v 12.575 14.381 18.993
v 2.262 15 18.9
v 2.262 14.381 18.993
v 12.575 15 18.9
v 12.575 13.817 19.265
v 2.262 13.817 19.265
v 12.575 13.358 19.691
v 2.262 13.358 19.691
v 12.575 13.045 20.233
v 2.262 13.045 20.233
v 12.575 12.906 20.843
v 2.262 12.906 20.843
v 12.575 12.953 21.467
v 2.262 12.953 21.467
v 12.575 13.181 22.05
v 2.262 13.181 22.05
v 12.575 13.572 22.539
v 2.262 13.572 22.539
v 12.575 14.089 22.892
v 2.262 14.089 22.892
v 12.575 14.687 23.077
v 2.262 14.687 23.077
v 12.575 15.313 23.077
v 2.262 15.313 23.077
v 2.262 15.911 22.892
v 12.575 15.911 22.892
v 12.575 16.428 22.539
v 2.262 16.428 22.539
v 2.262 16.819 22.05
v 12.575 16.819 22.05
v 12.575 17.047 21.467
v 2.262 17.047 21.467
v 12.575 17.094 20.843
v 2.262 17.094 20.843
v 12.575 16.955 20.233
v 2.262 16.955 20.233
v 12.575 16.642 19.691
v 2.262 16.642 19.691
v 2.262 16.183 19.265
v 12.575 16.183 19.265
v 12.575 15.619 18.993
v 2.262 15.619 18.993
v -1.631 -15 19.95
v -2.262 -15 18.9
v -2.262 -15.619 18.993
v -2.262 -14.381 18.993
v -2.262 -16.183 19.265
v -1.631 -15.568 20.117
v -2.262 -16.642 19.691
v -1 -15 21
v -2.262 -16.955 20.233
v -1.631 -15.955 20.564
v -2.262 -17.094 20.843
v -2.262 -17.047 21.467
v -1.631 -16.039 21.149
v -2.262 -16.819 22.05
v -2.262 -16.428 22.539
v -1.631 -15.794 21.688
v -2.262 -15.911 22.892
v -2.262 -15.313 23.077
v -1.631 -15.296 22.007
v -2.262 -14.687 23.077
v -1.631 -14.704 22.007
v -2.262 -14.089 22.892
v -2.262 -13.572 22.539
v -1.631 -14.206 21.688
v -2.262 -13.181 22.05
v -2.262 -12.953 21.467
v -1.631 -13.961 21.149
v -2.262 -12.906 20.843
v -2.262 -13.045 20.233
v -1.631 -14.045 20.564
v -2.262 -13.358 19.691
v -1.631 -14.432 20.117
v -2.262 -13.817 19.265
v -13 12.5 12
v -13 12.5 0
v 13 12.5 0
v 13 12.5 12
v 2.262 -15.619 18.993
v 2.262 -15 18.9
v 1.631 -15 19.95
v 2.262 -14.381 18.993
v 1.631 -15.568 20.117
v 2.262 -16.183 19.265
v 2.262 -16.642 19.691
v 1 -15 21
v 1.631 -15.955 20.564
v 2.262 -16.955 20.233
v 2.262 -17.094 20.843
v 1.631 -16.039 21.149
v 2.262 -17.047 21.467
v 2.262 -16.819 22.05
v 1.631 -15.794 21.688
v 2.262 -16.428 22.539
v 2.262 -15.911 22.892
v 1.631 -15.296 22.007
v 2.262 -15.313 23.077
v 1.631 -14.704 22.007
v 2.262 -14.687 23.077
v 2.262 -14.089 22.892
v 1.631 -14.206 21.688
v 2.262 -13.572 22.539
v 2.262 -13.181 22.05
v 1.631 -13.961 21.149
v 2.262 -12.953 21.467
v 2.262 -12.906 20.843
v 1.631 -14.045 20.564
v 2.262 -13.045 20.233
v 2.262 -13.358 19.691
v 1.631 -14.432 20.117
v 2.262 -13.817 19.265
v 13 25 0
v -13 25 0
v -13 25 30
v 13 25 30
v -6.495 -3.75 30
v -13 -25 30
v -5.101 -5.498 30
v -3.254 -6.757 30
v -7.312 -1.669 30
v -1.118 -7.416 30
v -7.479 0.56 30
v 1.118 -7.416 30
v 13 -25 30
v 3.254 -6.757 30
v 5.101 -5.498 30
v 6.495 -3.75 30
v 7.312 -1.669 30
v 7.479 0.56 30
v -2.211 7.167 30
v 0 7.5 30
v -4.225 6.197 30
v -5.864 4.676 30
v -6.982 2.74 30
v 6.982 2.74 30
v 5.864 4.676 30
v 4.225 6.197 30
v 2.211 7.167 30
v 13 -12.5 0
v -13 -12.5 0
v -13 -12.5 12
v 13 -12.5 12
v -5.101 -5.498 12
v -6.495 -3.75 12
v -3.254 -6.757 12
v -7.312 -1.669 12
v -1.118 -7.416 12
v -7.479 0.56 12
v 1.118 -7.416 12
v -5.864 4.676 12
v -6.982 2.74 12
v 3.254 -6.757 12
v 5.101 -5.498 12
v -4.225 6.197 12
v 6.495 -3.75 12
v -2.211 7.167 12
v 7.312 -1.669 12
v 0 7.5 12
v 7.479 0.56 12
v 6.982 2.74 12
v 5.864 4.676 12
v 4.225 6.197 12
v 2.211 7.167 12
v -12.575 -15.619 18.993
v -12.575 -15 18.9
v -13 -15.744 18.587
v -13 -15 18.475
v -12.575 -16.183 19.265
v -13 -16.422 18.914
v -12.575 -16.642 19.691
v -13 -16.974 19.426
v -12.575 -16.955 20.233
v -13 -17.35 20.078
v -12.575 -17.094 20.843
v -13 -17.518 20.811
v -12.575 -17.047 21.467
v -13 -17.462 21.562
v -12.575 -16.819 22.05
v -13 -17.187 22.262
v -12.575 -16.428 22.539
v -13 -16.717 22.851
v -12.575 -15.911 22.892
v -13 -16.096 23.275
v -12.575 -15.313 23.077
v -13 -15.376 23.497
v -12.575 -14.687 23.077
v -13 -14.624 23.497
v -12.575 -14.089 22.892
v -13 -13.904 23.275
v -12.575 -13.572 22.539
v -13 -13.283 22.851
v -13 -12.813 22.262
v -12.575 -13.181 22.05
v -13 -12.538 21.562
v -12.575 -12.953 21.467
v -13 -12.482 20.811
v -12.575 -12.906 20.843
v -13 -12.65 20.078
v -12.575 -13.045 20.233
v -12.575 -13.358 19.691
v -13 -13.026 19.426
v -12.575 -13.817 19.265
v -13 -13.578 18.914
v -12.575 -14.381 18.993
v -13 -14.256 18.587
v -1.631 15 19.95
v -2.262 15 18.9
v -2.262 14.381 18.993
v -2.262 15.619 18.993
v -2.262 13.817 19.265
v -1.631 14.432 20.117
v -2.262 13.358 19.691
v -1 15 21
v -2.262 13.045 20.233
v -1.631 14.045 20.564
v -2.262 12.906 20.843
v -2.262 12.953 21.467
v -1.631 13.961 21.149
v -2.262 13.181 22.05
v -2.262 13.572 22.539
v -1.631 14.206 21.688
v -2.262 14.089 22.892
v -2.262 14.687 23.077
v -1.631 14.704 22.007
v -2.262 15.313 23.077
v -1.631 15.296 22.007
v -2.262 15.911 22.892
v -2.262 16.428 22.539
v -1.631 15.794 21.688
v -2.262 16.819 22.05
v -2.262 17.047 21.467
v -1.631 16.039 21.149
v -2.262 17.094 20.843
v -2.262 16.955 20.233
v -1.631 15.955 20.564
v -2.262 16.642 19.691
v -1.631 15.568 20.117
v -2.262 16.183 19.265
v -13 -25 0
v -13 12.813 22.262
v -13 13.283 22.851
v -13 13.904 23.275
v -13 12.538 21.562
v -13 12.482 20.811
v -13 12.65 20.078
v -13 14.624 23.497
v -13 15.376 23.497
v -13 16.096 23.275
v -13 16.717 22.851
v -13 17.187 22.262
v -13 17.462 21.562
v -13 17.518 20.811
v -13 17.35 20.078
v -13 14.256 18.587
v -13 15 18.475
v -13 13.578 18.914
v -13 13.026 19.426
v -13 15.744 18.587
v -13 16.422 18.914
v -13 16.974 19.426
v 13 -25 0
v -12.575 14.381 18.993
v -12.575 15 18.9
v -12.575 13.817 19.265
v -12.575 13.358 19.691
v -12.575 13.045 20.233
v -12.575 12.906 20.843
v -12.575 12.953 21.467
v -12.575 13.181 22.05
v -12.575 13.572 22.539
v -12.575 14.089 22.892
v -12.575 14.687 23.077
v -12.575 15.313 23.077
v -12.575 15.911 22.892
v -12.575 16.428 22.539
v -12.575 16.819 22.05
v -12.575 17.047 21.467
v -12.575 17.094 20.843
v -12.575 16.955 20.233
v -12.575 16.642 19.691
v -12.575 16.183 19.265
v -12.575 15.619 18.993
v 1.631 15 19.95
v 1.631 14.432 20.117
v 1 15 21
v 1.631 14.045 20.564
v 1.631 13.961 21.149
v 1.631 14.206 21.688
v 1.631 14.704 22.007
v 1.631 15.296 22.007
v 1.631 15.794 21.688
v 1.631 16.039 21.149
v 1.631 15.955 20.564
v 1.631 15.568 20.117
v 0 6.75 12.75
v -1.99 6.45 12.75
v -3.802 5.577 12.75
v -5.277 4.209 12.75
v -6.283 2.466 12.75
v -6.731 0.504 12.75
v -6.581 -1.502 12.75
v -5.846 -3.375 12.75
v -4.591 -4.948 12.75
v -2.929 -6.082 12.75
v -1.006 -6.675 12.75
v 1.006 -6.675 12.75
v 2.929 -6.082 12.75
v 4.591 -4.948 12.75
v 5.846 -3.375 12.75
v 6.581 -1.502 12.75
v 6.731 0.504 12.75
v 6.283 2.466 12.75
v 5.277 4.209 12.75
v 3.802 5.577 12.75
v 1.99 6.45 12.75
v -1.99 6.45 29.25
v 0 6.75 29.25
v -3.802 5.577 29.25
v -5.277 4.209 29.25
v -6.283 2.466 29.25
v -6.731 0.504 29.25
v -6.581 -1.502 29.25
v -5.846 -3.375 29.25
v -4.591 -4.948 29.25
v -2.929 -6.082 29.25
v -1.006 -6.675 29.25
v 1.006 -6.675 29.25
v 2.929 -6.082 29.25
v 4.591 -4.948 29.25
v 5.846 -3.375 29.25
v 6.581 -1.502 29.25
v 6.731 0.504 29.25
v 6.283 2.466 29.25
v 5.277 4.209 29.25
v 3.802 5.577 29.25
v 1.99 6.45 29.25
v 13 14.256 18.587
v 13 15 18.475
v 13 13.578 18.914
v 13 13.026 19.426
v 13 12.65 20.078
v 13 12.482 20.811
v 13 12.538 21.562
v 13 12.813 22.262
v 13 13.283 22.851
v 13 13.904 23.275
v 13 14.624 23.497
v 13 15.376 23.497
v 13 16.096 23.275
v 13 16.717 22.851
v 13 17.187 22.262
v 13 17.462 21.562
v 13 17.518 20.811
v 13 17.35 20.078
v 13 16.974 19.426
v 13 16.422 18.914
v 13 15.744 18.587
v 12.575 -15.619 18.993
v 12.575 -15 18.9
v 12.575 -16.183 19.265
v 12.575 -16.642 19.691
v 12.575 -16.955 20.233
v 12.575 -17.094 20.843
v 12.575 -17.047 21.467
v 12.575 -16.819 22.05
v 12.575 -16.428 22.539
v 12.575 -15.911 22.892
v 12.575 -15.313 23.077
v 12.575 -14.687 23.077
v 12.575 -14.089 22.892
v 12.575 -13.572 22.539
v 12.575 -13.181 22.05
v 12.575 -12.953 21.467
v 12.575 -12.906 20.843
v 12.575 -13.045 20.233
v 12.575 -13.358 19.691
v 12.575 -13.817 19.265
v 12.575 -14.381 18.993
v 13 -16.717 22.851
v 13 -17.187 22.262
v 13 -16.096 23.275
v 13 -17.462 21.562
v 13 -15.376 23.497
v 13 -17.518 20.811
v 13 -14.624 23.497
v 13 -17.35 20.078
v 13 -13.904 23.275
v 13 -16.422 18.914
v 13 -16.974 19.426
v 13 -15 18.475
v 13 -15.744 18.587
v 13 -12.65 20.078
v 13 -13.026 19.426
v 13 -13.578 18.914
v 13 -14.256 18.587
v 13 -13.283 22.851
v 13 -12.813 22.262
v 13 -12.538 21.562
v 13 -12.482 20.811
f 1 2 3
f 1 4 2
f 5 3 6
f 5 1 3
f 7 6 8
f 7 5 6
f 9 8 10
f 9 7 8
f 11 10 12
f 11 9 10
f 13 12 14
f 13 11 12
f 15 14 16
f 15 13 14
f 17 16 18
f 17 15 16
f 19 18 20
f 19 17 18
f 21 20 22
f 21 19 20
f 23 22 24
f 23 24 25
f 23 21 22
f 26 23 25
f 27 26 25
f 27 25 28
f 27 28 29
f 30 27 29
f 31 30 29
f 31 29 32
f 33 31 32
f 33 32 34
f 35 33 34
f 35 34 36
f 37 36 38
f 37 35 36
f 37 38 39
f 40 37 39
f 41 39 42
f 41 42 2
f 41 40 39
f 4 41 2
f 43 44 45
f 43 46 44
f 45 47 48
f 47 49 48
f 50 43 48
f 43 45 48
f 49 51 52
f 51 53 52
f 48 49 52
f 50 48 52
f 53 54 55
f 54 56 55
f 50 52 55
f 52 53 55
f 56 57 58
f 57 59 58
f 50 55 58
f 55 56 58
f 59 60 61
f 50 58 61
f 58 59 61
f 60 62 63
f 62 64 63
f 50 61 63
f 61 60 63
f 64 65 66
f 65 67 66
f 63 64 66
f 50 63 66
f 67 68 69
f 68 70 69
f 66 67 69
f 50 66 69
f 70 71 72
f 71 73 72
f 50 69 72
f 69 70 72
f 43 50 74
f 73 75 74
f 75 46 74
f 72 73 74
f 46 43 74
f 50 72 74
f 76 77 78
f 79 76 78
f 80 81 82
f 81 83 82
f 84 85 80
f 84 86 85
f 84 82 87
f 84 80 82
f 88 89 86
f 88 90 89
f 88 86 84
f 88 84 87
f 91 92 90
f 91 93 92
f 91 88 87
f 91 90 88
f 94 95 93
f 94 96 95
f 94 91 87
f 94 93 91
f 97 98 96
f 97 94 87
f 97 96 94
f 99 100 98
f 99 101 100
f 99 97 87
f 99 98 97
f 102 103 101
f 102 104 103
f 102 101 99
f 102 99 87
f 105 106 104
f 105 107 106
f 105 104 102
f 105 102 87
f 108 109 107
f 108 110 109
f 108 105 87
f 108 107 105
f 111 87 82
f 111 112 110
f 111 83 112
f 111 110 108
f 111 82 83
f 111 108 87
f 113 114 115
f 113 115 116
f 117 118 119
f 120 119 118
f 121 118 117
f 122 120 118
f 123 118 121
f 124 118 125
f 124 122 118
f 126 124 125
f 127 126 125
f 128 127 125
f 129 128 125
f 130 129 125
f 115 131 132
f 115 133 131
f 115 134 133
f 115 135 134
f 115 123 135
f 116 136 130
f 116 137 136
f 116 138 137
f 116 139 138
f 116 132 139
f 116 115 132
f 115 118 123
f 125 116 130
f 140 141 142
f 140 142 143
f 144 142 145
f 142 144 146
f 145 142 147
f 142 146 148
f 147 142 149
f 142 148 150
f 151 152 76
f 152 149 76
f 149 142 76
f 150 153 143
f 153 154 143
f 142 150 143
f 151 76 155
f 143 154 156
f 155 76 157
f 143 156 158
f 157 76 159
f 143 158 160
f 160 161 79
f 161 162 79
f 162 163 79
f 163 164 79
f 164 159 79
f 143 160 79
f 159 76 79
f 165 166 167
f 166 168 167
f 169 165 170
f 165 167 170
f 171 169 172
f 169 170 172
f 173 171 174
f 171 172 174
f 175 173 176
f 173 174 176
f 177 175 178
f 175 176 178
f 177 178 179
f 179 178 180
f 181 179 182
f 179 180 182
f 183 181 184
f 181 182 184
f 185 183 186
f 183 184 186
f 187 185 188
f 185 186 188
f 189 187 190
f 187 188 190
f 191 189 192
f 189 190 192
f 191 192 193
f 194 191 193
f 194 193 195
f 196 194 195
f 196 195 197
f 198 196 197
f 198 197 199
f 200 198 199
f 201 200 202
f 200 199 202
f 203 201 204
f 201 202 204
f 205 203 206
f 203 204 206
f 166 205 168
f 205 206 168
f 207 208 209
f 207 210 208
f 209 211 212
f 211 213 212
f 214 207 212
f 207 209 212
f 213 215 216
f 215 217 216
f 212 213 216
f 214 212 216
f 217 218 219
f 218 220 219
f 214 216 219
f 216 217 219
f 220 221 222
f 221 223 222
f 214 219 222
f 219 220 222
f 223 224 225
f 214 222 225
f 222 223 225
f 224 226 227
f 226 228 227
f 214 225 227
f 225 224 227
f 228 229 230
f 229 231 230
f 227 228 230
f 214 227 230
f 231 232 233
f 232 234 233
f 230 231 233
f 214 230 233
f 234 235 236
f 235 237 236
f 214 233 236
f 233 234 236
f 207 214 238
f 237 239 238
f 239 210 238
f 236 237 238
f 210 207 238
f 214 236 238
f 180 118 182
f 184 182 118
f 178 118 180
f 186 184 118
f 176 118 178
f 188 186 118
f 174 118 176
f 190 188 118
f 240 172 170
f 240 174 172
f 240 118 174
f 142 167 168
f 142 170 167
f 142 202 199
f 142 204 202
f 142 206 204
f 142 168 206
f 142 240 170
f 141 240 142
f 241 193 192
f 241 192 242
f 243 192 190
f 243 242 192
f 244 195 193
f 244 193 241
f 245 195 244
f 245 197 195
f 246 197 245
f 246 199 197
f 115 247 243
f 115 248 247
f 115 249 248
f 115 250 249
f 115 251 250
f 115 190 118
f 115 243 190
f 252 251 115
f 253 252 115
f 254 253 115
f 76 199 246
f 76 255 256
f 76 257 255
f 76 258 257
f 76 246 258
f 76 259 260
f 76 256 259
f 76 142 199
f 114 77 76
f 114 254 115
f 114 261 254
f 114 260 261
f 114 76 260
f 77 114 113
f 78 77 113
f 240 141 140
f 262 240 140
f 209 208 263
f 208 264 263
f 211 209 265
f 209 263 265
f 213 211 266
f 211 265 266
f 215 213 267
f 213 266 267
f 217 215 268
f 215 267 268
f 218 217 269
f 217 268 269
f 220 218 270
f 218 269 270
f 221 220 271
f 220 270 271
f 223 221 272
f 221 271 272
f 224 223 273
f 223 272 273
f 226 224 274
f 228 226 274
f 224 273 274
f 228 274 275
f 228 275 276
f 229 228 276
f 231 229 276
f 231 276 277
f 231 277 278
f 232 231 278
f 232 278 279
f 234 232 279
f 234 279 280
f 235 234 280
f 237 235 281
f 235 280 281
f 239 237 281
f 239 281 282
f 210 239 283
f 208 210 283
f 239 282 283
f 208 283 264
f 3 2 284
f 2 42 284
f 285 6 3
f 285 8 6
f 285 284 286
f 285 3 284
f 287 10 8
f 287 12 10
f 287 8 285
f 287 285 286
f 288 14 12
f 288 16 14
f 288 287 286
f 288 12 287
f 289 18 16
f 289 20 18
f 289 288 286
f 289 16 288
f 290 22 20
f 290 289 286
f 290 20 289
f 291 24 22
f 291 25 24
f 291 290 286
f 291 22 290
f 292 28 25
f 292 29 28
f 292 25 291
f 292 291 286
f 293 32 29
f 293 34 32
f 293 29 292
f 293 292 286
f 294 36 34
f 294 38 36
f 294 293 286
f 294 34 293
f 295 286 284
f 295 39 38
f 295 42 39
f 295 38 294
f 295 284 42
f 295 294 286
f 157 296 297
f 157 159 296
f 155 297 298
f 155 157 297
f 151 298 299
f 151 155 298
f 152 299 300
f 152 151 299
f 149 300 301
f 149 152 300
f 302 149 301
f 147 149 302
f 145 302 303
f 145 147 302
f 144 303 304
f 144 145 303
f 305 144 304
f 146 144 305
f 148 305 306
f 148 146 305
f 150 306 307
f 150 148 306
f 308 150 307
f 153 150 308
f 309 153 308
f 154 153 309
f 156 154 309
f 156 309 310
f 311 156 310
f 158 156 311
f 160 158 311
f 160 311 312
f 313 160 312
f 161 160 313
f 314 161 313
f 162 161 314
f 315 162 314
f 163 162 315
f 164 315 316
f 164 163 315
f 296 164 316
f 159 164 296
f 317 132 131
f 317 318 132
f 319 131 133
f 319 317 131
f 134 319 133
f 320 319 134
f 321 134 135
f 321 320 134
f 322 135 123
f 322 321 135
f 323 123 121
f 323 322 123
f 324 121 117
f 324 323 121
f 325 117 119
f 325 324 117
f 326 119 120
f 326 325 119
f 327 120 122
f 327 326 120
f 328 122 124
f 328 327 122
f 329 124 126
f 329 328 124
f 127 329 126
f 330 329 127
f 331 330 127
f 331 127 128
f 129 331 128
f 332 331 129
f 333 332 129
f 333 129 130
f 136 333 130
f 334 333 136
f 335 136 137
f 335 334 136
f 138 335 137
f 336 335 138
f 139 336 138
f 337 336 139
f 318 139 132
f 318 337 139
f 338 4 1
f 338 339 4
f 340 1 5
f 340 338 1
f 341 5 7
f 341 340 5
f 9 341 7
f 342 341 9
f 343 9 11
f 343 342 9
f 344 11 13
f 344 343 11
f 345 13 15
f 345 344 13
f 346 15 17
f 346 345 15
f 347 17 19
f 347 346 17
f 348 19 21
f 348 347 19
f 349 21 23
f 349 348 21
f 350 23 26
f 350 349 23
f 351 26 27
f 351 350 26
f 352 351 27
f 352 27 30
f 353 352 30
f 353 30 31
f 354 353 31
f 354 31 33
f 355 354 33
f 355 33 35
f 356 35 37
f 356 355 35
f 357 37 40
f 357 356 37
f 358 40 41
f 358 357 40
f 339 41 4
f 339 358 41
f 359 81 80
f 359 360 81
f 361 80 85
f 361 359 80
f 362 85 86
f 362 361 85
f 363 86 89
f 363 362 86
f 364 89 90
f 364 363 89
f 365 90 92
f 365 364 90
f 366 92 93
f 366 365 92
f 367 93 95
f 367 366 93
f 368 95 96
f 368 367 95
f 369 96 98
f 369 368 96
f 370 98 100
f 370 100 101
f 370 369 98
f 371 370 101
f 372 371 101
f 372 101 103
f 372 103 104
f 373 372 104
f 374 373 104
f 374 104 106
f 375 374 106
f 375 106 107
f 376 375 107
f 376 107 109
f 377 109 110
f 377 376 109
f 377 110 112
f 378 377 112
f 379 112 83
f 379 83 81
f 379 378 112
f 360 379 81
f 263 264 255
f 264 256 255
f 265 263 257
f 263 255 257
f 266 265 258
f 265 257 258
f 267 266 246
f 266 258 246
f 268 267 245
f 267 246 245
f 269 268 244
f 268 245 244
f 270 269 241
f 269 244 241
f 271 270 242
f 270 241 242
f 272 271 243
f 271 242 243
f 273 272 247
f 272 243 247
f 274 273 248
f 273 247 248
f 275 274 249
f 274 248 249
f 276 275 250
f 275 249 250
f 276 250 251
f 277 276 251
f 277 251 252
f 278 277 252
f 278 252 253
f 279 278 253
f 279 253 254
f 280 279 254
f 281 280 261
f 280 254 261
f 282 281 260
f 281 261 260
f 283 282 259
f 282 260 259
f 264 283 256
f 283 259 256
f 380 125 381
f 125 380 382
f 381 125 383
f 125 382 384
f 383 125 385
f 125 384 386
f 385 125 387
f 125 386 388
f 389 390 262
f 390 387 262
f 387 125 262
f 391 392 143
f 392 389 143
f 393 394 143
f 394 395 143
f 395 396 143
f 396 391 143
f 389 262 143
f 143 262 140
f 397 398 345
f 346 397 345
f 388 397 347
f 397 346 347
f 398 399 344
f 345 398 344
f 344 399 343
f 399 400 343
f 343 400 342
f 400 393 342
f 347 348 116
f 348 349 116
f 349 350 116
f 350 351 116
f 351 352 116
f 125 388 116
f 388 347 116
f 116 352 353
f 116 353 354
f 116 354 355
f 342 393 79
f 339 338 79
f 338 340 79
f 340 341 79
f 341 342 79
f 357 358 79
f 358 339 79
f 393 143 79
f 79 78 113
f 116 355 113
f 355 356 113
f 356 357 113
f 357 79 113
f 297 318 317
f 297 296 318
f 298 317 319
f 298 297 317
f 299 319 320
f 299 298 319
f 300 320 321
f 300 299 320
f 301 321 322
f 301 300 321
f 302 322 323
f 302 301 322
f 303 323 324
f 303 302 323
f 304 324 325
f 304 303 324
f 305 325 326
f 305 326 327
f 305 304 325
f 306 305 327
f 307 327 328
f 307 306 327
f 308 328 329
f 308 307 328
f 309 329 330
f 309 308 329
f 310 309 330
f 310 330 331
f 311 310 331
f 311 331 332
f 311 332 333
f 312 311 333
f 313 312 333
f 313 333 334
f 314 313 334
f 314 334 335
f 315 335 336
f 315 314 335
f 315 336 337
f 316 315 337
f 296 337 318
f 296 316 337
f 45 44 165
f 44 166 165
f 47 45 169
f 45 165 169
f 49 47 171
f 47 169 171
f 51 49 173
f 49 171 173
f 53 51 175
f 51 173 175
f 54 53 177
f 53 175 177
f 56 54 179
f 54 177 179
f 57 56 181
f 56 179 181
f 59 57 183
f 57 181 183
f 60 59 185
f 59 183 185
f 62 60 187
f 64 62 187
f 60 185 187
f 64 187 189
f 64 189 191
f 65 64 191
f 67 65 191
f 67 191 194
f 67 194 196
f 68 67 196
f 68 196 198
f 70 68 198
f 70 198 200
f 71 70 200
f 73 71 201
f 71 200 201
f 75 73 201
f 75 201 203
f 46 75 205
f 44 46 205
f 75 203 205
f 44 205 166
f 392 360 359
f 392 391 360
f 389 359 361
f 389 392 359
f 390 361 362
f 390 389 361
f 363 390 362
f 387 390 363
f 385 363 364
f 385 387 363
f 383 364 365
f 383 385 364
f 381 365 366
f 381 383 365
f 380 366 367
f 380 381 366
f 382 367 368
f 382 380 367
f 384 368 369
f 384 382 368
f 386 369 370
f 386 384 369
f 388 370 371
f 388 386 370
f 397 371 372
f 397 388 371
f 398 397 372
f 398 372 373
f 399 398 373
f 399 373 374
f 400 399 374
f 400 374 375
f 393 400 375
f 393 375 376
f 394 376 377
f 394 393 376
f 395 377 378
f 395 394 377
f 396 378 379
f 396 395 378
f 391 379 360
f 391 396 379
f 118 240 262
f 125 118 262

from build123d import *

# Parameters (mm, degrees)
SKETCH1_W                      = 26
SKETCH1_H                      = 50
BOSS_EXTRUDE1_DEPTH            = 30
SKETCH2_W                      = 26
SKETCH2_H                      = 25
CUT_EXTRUDE1_DEPTH             = 12
M5X0_8_TAPPED_HOLE1_AT_2_COUNT = 2
M5X0_8_TAPPED_HOLE1_AT_2_PITCH = 30


with BuildPart() as part:
    # Sketch1 → Boss-Extrude1 (new body)
    with BuildSketch(Plane.XY):
        Rectangle(SKETCH1_W, SKETCH1_H)
    extrude(amount=BOSS_EXTRUDE1_DEPTH)

    # Sketch2 → Cut-Extrude1 (cut)
    with BuildSketch(Plane.XY):
        Rectangle(SKETCH2_W, SKETCH2_H)
    extrude(amount=CUT_EXTRUDE1_DEPTH, mode=Mode.SUBTRACT)

    # Sketch8 → M12 Clearance Hole1 (revolve, cut)
    with BuildSketch(Plane(origin=(0, 0, 12), x_dir=(0, 1, 0), z_dir=(1, 0, 0))):
        Polygon((0, 0), (0, 18), (7.5, 18), (6.75, 17.25), (6.75, 0.75), (7.5, 0), align=None)
    revolve(axis=Axis((0, 0, 5.65), (0, 0, 1)), mode=Mode.SUBTRACT)

    # Sketch11 → M5x0.8 Tapped Hole1 (revolve, cut)
    with BuildSketch(Plane(origin=(13, 15, 21), x_dir=(0, 0, -1), z_dir=(0, 1, 0))):
        Polygon((0, 0), (0, 12), (2.1, 10.7381927), (2.1, 0.425), (2.525, 0), align=None)
    m5x0_8_tapped_hole1 = revolve(axis=Axis((19.35, 15, 21), (-1, 0, 0)), mode=Mode.SUBTRACT)

    # M5x0.8 Tapped Hole1 at 2: M5x0.8 Tapped Hole1 ×2
    with Locations(*[(0, -i * M5X0_8_TAPPED_HOLE1_AT_2_PITCH, 0) for i in range(1, M5X0_8_TAPPED_HOLE1_AT_2_COUNT)]):
        add(m5x0_8_tapped_hole1, mode=Mode.SUBTRACT)

    # Mirror1: M5x0.8 Tapped Hole1 across plane
    add(m5x0_8_tapped_hole1.mirror(Plane(origin=(0, 0, 0), x_dir=(0, 0, 1), z_dir=(1, 0, 0))), mode=Mode.SUBTRACT)

    # Mirror1 copy 1 sketch → Mirror1 copy 1 (revolve, cut)
    with BuildSketch(Plane(origin=(-13, -15, 21), x_dir=(0, 0, -1), z_dir=(0, 1, 0))):
        Polygon((0, 0), (0, -12), (2.1, -10.7381927), (2.1, -0.425), (2.525, 0), align=None)
    revolve(axis=Axis((-19.35, -15, 21), (-1, 0, 0)), mode=Mode.SUBTRACT)


solid = part.part
